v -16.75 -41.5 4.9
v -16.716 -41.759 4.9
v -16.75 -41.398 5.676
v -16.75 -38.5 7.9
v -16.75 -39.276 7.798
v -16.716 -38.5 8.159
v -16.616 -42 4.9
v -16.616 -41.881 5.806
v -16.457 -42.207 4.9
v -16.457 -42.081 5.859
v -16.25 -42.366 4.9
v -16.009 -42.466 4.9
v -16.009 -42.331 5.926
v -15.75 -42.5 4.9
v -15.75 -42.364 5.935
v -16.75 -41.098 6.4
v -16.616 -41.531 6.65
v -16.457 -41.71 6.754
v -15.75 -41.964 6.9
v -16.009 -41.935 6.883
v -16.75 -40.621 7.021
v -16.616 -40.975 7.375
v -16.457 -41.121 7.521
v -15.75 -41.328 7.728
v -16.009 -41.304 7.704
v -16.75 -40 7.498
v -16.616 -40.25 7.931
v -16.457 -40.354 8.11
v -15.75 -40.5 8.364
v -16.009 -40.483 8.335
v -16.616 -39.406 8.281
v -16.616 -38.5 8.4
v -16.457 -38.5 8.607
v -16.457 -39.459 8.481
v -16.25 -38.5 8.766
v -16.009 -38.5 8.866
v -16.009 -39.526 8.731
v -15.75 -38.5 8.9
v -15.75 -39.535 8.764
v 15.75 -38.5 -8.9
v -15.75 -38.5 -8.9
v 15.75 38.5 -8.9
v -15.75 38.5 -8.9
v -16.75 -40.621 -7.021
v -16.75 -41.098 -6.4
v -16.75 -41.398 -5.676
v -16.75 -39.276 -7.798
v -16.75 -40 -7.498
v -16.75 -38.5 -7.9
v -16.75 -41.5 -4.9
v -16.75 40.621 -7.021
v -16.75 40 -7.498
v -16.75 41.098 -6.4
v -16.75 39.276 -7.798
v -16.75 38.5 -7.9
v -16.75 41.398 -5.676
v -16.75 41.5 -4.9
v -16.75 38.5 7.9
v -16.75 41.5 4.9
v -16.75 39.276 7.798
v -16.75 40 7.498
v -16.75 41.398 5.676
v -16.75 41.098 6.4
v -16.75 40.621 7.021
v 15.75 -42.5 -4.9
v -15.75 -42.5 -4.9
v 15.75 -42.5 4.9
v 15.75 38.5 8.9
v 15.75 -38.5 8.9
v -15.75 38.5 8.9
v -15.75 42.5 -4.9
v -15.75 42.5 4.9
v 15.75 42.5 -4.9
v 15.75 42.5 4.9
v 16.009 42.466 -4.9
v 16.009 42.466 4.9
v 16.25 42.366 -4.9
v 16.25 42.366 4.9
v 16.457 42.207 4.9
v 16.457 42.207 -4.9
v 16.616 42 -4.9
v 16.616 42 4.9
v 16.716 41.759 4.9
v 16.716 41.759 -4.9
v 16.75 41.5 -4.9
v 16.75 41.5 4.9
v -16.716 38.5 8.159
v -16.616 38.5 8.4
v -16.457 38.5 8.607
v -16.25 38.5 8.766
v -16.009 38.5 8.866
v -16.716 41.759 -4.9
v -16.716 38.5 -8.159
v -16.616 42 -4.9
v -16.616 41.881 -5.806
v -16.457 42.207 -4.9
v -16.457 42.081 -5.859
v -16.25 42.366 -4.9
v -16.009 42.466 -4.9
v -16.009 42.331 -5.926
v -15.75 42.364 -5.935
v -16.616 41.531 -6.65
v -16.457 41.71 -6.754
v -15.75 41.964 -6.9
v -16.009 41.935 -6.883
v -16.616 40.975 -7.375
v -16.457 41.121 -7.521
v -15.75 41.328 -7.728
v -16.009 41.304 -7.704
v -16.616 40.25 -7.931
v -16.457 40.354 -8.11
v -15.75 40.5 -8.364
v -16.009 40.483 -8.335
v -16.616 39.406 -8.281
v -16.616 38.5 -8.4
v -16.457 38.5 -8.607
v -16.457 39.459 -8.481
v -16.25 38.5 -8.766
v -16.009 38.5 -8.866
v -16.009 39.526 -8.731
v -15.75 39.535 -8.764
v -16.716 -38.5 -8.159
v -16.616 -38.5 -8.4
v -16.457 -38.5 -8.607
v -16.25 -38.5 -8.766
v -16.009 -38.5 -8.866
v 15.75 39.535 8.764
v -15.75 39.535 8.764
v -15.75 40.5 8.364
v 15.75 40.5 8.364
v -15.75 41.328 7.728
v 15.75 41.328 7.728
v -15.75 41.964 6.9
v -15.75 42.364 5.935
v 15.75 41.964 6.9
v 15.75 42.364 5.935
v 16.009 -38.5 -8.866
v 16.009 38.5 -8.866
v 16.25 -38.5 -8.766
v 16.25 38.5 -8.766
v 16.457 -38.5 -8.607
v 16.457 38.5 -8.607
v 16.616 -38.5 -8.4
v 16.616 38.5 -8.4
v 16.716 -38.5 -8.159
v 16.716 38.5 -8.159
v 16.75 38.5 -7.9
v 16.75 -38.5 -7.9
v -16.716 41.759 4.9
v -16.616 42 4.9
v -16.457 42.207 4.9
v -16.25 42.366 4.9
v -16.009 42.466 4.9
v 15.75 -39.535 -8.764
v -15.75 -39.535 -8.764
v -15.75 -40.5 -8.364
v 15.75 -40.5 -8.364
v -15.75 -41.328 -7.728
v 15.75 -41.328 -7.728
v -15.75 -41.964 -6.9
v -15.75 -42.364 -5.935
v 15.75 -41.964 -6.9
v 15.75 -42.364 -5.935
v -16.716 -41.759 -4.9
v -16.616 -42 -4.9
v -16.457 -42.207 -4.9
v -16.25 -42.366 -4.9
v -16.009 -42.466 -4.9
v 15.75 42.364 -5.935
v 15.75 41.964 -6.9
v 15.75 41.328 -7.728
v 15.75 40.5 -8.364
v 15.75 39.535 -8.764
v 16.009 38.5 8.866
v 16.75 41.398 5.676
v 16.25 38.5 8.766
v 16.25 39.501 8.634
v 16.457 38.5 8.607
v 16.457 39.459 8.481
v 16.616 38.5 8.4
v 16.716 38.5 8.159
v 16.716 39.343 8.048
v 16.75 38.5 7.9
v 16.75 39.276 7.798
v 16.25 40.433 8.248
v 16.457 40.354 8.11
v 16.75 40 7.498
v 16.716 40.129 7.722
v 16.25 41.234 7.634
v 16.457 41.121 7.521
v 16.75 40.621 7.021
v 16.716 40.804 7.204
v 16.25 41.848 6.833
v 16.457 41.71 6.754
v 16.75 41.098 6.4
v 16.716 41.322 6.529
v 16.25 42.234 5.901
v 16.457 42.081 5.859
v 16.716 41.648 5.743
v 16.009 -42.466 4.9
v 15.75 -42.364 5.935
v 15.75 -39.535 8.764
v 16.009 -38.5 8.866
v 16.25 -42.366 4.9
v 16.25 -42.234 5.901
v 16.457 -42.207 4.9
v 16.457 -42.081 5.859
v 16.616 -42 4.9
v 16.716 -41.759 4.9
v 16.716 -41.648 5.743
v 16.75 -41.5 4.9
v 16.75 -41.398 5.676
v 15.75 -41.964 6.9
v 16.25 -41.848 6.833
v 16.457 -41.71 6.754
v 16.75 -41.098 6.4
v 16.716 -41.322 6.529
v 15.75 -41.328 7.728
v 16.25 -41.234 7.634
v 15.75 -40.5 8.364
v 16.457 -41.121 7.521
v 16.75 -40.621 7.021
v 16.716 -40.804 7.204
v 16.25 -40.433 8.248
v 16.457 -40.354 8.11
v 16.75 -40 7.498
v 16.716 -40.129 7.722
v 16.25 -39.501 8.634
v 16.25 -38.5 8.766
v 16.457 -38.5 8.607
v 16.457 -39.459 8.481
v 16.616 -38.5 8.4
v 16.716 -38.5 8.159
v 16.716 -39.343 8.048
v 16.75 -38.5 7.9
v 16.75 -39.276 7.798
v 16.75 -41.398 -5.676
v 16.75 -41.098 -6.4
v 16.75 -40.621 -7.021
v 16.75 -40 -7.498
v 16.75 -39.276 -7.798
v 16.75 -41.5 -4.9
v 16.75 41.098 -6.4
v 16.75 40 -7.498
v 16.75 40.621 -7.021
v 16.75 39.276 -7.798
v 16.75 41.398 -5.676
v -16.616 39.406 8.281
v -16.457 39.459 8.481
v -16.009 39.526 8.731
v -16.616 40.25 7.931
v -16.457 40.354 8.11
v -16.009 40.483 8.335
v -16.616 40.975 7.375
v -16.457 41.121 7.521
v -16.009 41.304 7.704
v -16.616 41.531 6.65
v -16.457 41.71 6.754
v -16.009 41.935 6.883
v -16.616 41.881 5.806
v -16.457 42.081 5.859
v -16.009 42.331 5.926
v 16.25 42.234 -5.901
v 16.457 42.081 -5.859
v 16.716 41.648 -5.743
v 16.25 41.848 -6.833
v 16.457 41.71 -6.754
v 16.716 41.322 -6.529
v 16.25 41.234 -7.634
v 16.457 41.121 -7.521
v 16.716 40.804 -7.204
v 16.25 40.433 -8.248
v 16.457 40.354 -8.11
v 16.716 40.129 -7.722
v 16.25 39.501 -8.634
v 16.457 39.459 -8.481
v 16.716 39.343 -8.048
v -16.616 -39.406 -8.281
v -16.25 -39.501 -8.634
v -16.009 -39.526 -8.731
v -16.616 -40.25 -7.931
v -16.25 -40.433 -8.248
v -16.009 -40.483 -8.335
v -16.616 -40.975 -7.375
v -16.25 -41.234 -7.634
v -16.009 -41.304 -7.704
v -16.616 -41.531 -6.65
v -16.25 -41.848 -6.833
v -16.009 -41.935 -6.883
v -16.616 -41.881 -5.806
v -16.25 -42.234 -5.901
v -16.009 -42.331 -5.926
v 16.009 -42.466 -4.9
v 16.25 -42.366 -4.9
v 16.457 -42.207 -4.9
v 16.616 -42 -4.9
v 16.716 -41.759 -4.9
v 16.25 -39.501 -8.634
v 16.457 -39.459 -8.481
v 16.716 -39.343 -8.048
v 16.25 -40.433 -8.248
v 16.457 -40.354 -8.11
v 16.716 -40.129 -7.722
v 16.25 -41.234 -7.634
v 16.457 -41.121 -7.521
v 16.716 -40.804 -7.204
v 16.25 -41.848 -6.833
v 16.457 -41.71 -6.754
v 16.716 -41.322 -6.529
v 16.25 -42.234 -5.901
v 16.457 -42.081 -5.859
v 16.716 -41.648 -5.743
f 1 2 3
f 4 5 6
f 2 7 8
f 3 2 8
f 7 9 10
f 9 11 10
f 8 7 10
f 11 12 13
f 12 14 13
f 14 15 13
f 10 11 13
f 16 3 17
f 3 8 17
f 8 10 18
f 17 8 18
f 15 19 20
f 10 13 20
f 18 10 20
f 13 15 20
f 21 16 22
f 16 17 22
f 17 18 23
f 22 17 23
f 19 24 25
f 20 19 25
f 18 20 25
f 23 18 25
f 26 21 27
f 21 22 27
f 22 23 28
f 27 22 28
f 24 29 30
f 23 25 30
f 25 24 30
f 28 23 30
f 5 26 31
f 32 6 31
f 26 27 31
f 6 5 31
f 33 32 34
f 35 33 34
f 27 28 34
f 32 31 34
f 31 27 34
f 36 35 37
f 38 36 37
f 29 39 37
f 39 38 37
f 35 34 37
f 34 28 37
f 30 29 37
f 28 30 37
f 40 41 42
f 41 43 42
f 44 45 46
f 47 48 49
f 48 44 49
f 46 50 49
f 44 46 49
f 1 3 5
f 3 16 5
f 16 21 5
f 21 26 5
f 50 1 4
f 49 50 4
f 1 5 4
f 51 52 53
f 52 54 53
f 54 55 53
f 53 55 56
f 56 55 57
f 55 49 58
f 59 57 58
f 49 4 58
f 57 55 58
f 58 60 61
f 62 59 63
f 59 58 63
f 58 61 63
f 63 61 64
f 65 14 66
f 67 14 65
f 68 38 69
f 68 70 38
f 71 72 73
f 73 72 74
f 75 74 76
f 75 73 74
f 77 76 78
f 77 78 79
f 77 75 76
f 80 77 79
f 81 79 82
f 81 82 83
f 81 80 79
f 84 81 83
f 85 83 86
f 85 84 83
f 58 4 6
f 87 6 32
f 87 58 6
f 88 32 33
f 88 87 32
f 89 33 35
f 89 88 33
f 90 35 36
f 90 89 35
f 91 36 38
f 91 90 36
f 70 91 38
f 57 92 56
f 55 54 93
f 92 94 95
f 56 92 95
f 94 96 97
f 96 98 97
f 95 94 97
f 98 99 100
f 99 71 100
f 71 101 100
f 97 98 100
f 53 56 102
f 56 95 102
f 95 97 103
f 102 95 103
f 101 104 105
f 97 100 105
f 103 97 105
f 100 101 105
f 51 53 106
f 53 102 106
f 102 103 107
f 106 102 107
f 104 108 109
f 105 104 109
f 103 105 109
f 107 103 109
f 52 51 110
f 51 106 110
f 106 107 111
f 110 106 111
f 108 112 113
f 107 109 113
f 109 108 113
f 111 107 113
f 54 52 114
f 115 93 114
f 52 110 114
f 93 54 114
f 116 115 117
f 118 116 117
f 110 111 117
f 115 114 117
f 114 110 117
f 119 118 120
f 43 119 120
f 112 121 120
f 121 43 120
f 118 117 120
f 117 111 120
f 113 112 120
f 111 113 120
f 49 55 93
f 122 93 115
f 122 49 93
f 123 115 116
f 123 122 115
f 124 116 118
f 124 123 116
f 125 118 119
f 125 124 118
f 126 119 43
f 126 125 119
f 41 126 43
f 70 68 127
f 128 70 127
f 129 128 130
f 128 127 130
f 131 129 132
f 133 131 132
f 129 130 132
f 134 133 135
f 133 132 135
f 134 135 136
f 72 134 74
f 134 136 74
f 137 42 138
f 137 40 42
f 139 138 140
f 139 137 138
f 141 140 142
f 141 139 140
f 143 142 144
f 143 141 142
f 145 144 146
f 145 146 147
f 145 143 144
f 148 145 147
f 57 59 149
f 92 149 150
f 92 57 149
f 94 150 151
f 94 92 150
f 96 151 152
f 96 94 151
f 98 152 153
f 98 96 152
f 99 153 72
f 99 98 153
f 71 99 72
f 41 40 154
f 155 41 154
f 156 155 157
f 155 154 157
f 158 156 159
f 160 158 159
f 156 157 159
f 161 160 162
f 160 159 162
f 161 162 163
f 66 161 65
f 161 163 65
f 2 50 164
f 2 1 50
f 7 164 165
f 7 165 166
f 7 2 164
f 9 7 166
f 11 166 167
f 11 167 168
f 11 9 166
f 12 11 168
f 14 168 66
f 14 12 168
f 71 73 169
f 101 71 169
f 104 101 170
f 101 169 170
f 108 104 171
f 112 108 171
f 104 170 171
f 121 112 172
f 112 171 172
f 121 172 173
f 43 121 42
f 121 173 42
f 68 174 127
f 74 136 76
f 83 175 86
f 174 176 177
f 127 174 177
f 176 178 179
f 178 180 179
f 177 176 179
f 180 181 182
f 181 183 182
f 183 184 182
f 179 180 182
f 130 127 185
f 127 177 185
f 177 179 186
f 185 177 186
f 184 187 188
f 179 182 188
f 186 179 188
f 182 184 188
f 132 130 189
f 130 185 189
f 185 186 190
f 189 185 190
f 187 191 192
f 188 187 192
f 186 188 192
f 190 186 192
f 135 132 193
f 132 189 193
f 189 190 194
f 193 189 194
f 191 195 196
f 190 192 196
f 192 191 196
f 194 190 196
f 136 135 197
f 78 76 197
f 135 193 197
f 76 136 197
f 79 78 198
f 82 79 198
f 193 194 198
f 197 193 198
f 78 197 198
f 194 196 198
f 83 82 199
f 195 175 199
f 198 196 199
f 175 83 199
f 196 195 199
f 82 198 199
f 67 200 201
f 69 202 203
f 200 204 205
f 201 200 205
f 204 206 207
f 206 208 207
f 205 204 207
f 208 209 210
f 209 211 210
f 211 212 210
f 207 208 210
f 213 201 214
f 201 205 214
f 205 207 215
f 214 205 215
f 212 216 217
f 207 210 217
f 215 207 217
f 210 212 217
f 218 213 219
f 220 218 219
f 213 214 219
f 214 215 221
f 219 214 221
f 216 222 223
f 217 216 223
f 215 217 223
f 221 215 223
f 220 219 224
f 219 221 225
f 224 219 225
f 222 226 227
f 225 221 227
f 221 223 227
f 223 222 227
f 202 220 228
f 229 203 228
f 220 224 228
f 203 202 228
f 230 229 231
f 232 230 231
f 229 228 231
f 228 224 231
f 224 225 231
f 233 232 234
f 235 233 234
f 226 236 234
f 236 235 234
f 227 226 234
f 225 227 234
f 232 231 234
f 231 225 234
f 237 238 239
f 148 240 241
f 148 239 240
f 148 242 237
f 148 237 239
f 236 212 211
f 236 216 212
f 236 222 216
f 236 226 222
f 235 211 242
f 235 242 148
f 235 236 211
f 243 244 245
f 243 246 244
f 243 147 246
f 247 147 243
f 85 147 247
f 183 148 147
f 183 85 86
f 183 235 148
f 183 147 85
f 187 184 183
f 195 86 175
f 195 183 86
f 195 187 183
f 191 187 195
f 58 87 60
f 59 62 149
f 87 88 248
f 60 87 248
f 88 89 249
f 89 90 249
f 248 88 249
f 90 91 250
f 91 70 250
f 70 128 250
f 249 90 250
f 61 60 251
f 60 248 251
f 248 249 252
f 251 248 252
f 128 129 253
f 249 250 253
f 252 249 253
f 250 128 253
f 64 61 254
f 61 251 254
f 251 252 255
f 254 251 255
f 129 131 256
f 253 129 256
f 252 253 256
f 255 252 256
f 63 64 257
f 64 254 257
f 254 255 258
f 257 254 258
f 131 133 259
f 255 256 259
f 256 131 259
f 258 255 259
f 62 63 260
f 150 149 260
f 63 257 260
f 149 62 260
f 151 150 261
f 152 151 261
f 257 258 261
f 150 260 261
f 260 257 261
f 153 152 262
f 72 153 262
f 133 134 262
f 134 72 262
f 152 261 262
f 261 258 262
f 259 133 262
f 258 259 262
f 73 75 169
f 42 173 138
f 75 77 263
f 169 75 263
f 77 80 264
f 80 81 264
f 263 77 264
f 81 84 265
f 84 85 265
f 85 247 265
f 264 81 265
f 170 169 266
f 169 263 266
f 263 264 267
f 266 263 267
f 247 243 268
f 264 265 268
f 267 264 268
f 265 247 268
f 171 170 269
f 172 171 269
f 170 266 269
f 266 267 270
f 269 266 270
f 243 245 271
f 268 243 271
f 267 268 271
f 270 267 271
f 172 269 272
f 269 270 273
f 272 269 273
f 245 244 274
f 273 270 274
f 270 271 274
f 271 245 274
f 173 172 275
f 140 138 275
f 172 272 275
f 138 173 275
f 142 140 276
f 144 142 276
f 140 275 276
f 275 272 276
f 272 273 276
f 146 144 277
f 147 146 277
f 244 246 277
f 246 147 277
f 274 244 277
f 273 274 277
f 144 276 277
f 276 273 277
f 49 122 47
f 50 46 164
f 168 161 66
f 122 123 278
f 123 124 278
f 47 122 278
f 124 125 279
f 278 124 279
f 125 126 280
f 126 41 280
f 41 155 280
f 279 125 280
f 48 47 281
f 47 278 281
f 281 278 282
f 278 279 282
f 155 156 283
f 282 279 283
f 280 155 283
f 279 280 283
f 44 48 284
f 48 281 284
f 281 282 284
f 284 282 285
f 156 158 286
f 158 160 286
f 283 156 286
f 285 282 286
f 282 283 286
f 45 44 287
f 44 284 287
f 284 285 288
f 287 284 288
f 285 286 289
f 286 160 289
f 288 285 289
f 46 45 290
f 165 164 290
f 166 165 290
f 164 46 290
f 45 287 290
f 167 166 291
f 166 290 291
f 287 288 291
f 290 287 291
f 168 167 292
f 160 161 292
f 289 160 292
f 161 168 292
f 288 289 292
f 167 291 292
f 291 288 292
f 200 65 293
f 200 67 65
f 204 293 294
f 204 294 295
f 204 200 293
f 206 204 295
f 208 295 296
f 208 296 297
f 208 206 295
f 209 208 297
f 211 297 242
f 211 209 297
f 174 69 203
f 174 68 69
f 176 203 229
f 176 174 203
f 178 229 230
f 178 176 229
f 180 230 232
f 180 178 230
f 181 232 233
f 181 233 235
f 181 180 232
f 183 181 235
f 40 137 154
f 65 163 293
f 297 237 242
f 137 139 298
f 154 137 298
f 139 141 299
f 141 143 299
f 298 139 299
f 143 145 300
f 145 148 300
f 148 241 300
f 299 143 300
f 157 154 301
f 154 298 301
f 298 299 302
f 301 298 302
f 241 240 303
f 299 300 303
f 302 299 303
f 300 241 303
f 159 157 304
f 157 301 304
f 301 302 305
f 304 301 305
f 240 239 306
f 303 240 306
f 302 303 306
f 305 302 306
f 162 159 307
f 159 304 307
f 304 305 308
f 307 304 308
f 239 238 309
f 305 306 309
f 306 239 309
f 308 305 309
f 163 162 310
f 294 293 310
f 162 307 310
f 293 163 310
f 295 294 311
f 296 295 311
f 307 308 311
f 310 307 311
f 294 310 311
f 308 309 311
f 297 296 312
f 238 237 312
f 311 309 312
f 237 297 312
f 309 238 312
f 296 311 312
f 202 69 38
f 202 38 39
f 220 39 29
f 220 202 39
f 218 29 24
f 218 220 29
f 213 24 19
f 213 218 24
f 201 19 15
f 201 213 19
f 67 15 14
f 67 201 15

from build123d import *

# Parameters (mm, degrees)
SKETCH1_W           = 33.5
SKETCH1_H           = 85
BOSS_EXTRUDE1_DEPTH = 8.9
FILLET1_R           = 4
FILLET2_R           = 1


with BuildPart() as part:
    # Sketch1 → Boss-Extrude1 (new, symmetric)
    with BuildSketch(Plane.XY):
        Rectangle(SKETCH1_W, SKETCH1_H)
    extrude(amount=BOSS_EXTRUDE1_DEPTH, both=True)

    # Fillet1
    fillet1_edges = [part.edges().sort_by_distance(p)[0] for p in [
        (0, -42.5, 8.9),
        (0, -42.5, -8.9),
        (0, 42.5, -8.9),
        (0, 42.5, 8.9),
    ]]
    fillet(fillet1_edges, radius=FILLET1_R)

    # Fillet2
    fillet2_edges = [part.edges().sort_by_distance(p)[0] for p in [
        (16.75, -42.5, 0),
        (-16.75, -42.5, 0),
        (16.75, 0, -8.9),
        (16.75, 42.5, 0),
        (16.75, 0, 8.9),
        (16.75, 41.328427125, 7.728427125),
        (16.75, 41.328427125, -7.728427125),
        (16.75, -41.328427125, 7.728427125),
        (16.75, -41.328427125, -7.728427125),
        (-16.75, 0, -8.9),
        (-16.75, 0, 8.9),
        (-16.75, 42.5, 0),
        (-16.75, 41.328427125, 7.728427125),
        (-16.75, 41.328427125, -7.728427125),
        (-16.75, -41.328427125, 7.728427125),
        (-16.75, -41.328427125, -7.728427125),
    ]]
    fillet(fillet2_edges, radius=FILLET2_R)


solid = part.part
